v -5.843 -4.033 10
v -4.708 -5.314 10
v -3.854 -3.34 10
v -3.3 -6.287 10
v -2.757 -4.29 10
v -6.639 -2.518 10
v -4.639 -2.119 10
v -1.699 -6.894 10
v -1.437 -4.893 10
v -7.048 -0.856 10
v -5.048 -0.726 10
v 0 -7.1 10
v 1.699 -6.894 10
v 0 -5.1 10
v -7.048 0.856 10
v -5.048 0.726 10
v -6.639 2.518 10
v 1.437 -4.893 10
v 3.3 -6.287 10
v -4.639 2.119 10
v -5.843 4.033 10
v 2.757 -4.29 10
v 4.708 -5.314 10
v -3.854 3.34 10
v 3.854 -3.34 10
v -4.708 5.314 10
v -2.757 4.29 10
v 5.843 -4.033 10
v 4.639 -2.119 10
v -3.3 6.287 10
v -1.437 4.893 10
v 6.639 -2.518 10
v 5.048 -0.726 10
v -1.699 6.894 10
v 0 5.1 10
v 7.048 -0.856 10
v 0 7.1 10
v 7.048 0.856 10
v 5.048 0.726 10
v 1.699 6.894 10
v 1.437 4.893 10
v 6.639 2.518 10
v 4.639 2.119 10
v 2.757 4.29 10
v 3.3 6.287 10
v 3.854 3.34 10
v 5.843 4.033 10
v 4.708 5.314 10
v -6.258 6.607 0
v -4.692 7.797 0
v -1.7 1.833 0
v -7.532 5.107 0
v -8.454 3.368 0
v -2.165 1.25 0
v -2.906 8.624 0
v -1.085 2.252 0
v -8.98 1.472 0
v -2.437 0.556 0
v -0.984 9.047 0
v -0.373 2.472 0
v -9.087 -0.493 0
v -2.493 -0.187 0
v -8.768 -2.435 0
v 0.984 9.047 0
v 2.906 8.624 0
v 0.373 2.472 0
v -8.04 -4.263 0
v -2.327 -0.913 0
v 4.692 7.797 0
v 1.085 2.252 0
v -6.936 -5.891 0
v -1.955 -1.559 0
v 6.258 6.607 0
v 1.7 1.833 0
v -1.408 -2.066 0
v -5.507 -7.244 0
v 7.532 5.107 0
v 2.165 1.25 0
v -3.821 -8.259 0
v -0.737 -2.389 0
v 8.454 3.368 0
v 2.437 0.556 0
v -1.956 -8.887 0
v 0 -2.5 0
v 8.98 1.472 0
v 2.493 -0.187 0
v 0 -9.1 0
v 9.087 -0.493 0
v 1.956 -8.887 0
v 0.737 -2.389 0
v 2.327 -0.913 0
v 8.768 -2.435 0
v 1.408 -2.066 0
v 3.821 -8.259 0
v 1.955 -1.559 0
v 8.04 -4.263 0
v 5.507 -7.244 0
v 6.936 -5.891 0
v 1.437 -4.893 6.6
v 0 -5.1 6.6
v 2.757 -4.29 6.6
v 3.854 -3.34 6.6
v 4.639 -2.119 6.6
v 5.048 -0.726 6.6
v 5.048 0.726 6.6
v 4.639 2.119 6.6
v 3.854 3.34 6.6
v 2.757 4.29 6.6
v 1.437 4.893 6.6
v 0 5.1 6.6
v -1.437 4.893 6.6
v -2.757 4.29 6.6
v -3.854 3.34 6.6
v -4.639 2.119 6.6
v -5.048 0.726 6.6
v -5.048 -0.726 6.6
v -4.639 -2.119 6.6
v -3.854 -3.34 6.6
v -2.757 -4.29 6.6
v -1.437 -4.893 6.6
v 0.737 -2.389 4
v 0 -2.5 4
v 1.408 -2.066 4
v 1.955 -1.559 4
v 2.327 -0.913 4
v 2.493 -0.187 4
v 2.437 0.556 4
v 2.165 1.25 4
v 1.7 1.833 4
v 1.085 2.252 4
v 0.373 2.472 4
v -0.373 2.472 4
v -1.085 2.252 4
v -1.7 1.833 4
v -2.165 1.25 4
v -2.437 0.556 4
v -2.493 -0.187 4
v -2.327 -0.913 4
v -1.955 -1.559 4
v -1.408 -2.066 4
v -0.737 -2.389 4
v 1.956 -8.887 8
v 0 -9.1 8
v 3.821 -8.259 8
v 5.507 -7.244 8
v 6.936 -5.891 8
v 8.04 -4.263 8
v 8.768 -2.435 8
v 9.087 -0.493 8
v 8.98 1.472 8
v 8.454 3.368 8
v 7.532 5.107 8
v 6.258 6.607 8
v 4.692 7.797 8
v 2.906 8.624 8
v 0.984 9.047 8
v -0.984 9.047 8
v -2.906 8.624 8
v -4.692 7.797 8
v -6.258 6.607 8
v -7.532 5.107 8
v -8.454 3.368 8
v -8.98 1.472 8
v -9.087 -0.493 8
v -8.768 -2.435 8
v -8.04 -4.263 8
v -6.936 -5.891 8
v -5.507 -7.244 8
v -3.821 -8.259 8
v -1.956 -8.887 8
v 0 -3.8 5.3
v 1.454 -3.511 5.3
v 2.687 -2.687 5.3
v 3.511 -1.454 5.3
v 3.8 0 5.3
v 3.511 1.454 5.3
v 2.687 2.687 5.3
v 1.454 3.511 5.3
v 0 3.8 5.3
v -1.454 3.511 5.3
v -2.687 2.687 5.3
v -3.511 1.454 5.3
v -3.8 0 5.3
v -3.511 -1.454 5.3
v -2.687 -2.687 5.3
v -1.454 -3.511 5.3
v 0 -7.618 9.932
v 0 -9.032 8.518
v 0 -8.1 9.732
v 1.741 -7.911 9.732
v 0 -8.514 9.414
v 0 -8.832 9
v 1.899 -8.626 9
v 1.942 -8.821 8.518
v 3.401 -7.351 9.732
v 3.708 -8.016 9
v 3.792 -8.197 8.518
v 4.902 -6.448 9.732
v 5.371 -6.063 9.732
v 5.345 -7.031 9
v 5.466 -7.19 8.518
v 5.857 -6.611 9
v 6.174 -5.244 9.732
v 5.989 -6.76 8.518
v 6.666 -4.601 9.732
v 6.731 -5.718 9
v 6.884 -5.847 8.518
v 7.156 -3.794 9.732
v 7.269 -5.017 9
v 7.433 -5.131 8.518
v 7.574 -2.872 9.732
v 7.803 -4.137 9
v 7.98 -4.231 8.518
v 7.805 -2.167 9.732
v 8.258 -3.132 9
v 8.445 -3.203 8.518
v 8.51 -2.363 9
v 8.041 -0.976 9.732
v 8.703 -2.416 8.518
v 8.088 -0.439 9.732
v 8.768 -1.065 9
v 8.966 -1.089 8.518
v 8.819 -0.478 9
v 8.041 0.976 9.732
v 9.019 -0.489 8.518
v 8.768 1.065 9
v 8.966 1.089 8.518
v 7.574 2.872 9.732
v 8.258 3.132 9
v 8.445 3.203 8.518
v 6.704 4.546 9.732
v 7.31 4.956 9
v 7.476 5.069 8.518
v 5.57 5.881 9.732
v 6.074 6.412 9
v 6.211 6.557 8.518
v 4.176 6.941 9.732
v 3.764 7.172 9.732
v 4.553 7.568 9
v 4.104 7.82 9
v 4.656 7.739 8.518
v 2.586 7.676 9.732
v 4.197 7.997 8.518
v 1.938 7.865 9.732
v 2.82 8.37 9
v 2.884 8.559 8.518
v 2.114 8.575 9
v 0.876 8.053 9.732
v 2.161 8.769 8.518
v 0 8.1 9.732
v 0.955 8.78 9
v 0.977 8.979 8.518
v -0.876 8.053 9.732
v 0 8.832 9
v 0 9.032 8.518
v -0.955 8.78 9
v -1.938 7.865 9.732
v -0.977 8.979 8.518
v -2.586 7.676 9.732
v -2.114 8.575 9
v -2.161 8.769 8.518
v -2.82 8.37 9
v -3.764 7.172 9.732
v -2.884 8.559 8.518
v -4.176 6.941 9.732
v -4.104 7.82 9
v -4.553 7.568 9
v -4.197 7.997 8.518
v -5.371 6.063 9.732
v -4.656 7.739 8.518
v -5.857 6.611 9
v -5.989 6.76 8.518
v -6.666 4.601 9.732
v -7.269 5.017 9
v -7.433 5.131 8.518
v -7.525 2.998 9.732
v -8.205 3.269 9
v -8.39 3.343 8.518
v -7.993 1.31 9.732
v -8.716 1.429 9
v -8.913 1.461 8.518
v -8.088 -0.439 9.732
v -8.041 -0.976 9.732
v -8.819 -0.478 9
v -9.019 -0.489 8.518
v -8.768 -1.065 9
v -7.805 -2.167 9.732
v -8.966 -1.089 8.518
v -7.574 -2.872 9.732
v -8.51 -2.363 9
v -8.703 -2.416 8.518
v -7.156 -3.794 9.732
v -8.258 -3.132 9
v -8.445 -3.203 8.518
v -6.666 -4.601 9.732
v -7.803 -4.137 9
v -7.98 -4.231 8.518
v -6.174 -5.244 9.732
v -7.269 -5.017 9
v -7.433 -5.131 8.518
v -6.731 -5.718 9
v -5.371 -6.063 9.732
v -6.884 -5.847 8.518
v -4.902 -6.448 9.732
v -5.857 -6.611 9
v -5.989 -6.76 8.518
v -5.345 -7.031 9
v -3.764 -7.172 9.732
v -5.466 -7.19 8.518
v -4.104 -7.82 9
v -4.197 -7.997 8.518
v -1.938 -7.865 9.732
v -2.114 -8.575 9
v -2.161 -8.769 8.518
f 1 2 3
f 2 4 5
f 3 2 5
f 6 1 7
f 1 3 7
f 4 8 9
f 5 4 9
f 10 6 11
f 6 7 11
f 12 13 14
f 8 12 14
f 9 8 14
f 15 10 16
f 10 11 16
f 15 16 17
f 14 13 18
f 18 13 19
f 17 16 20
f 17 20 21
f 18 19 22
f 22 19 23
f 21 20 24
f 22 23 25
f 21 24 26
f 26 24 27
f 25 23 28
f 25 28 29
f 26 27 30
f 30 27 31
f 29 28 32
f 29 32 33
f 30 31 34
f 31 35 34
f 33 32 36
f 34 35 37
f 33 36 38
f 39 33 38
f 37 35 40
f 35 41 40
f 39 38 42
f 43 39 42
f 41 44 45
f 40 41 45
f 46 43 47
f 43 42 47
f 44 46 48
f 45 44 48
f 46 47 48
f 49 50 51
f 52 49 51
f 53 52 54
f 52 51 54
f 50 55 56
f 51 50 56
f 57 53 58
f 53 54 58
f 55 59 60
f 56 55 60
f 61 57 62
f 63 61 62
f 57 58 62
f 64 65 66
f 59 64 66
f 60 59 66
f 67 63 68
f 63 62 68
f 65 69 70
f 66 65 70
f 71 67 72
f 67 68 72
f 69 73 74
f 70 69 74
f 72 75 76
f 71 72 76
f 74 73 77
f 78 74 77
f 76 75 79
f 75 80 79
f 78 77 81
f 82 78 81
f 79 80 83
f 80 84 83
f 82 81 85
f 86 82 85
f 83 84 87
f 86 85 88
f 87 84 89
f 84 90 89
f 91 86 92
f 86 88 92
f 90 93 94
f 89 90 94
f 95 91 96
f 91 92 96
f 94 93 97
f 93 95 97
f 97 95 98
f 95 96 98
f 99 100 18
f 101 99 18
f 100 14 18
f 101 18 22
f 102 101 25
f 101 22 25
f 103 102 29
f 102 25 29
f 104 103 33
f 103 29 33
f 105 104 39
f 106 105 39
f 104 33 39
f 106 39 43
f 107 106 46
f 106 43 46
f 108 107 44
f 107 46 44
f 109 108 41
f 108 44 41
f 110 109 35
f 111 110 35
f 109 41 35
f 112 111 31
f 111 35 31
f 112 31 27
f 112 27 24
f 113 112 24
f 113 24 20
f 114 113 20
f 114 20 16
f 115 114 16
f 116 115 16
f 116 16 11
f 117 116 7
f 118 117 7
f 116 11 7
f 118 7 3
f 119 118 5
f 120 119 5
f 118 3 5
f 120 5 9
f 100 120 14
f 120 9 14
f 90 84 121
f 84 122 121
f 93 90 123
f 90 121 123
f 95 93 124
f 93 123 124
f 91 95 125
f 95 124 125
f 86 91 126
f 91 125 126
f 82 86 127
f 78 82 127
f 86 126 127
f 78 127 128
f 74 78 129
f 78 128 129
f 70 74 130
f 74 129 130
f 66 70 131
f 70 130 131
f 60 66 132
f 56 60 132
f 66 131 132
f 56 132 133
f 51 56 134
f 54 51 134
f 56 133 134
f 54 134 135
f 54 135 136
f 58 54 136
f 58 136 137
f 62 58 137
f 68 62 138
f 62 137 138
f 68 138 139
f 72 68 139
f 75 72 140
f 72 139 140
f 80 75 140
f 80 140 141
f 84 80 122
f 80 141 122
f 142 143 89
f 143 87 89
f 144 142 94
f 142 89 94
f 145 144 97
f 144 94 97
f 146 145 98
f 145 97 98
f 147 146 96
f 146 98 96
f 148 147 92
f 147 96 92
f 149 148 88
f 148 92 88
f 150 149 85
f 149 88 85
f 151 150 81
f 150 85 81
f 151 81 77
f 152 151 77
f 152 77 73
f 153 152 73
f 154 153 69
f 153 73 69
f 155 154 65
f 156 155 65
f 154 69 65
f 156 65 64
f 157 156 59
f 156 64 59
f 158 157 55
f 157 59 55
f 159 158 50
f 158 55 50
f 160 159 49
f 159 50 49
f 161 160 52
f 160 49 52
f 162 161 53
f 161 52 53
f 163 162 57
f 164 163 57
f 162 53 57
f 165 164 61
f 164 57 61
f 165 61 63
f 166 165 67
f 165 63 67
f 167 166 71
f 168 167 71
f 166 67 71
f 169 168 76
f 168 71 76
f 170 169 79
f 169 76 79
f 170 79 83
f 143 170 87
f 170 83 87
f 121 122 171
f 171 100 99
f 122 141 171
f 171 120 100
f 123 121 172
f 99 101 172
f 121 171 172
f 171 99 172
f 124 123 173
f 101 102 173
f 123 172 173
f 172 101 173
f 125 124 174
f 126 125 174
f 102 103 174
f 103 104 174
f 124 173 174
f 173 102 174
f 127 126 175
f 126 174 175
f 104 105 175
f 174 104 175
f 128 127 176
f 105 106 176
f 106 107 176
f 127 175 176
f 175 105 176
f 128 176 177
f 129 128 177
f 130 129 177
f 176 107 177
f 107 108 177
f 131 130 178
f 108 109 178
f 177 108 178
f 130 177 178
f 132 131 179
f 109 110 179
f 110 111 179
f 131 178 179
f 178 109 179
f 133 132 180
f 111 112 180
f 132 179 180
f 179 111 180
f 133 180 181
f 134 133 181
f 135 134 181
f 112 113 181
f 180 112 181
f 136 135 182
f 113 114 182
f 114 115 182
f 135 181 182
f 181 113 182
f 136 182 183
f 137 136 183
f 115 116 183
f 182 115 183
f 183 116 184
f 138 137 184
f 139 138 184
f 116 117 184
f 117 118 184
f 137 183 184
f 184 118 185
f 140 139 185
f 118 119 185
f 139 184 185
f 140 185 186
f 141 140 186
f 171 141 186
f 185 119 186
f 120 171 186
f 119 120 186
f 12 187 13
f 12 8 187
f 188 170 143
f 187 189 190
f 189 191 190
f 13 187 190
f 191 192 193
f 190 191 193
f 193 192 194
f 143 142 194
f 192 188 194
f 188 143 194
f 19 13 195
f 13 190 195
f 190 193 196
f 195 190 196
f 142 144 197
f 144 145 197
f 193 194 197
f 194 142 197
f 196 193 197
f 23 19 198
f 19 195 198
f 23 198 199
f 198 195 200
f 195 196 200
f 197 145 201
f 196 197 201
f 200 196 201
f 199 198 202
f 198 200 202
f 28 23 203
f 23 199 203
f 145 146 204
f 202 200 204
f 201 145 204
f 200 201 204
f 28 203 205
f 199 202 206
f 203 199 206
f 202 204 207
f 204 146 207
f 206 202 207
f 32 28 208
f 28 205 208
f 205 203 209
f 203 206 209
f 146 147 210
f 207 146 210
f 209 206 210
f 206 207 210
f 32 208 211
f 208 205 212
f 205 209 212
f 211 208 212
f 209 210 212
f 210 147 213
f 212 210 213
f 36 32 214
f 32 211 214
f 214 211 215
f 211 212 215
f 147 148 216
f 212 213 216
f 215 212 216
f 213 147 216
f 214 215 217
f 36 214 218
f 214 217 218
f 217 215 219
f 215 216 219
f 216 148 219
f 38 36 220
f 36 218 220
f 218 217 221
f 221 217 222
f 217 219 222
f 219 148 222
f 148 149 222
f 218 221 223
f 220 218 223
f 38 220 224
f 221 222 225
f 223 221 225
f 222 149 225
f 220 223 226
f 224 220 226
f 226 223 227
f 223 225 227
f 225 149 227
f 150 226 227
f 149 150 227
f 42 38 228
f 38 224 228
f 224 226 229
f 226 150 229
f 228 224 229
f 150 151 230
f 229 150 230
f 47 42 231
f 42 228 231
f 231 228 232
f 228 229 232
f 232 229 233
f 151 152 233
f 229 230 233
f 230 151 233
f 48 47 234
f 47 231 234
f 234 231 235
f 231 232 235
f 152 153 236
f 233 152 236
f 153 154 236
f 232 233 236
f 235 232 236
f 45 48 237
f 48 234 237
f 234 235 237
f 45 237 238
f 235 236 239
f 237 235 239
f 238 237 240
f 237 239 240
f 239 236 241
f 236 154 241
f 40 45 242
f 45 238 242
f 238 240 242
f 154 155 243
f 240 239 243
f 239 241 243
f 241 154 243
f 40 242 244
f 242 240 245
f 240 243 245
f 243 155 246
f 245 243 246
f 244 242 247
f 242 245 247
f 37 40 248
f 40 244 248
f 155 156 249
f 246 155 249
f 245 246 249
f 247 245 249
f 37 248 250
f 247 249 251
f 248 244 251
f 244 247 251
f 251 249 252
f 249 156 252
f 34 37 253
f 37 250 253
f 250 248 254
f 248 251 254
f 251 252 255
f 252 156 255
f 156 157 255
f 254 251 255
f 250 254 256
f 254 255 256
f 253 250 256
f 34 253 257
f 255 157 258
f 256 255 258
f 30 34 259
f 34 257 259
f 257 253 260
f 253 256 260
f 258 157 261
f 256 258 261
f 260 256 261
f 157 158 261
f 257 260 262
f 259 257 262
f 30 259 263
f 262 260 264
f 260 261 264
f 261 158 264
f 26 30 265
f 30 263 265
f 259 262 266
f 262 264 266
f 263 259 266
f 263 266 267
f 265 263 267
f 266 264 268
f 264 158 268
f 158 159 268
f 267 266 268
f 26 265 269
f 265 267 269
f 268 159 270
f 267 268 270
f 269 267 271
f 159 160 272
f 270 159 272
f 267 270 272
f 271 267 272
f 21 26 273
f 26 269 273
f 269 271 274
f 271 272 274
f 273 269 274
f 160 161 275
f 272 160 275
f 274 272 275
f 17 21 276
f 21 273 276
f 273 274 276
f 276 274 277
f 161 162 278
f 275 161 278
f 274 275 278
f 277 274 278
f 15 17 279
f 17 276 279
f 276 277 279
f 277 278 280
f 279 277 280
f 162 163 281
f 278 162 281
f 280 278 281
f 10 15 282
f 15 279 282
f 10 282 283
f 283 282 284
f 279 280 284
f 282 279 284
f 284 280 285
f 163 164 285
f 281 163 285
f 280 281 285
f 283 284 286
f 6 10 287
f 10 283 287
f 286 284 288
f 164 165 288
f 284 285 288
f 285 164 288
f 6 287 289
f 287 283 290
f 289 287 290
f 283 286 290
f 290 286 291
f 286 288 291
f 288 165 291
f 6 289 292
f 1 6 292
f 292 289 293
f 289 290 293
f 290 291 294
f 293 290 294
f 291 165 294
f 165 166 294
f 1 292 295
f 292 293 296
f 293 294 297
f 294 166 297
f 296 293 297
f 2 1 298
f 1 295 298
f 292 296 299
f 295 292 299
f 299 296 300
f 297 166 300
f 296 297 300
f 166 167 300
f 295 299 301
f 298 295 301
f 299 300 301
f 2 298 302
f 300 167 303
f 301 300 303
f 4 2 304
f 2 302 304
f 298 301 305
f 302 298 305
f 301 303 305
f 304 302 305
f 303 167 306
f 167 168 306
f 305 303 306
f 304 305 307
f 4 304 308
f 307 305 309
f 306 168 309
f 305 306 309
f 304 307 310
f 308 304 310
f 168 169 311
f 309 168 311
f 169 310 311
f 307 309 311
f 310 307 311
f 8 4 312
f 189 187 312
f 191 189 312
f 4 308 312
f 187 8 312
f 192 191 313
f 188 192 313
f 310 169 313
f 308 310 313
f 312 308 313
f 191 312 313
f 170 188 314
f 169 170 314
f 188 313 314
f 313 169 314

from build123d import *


with BuildPart() as f1:
    # F0 (on Right) → F1 (revolve)
    with BuildSketch(Plane.YZ):
        with BuildLine():
            Line((-9.1, 0), (-2.5, 0))
            Line((-2.5, 0), (-2.5, 4))
            Line((-2.5, 4), (-5.1, 6.6))
            Line((-5.1, 6.6), (-5.1, 10))
            Line((-5.1, 10), (-7.1, 10))
            ThreePointArc((-7.1, 10), (-8.514214, 9.414214), (-9.1, 8))
            Line((-9.1, 8), (-9.1, 0))
        make_face()
    revolve(axis=Axis((0, 0, 6.063), (0, 0, 1)))


solid = f1.part
